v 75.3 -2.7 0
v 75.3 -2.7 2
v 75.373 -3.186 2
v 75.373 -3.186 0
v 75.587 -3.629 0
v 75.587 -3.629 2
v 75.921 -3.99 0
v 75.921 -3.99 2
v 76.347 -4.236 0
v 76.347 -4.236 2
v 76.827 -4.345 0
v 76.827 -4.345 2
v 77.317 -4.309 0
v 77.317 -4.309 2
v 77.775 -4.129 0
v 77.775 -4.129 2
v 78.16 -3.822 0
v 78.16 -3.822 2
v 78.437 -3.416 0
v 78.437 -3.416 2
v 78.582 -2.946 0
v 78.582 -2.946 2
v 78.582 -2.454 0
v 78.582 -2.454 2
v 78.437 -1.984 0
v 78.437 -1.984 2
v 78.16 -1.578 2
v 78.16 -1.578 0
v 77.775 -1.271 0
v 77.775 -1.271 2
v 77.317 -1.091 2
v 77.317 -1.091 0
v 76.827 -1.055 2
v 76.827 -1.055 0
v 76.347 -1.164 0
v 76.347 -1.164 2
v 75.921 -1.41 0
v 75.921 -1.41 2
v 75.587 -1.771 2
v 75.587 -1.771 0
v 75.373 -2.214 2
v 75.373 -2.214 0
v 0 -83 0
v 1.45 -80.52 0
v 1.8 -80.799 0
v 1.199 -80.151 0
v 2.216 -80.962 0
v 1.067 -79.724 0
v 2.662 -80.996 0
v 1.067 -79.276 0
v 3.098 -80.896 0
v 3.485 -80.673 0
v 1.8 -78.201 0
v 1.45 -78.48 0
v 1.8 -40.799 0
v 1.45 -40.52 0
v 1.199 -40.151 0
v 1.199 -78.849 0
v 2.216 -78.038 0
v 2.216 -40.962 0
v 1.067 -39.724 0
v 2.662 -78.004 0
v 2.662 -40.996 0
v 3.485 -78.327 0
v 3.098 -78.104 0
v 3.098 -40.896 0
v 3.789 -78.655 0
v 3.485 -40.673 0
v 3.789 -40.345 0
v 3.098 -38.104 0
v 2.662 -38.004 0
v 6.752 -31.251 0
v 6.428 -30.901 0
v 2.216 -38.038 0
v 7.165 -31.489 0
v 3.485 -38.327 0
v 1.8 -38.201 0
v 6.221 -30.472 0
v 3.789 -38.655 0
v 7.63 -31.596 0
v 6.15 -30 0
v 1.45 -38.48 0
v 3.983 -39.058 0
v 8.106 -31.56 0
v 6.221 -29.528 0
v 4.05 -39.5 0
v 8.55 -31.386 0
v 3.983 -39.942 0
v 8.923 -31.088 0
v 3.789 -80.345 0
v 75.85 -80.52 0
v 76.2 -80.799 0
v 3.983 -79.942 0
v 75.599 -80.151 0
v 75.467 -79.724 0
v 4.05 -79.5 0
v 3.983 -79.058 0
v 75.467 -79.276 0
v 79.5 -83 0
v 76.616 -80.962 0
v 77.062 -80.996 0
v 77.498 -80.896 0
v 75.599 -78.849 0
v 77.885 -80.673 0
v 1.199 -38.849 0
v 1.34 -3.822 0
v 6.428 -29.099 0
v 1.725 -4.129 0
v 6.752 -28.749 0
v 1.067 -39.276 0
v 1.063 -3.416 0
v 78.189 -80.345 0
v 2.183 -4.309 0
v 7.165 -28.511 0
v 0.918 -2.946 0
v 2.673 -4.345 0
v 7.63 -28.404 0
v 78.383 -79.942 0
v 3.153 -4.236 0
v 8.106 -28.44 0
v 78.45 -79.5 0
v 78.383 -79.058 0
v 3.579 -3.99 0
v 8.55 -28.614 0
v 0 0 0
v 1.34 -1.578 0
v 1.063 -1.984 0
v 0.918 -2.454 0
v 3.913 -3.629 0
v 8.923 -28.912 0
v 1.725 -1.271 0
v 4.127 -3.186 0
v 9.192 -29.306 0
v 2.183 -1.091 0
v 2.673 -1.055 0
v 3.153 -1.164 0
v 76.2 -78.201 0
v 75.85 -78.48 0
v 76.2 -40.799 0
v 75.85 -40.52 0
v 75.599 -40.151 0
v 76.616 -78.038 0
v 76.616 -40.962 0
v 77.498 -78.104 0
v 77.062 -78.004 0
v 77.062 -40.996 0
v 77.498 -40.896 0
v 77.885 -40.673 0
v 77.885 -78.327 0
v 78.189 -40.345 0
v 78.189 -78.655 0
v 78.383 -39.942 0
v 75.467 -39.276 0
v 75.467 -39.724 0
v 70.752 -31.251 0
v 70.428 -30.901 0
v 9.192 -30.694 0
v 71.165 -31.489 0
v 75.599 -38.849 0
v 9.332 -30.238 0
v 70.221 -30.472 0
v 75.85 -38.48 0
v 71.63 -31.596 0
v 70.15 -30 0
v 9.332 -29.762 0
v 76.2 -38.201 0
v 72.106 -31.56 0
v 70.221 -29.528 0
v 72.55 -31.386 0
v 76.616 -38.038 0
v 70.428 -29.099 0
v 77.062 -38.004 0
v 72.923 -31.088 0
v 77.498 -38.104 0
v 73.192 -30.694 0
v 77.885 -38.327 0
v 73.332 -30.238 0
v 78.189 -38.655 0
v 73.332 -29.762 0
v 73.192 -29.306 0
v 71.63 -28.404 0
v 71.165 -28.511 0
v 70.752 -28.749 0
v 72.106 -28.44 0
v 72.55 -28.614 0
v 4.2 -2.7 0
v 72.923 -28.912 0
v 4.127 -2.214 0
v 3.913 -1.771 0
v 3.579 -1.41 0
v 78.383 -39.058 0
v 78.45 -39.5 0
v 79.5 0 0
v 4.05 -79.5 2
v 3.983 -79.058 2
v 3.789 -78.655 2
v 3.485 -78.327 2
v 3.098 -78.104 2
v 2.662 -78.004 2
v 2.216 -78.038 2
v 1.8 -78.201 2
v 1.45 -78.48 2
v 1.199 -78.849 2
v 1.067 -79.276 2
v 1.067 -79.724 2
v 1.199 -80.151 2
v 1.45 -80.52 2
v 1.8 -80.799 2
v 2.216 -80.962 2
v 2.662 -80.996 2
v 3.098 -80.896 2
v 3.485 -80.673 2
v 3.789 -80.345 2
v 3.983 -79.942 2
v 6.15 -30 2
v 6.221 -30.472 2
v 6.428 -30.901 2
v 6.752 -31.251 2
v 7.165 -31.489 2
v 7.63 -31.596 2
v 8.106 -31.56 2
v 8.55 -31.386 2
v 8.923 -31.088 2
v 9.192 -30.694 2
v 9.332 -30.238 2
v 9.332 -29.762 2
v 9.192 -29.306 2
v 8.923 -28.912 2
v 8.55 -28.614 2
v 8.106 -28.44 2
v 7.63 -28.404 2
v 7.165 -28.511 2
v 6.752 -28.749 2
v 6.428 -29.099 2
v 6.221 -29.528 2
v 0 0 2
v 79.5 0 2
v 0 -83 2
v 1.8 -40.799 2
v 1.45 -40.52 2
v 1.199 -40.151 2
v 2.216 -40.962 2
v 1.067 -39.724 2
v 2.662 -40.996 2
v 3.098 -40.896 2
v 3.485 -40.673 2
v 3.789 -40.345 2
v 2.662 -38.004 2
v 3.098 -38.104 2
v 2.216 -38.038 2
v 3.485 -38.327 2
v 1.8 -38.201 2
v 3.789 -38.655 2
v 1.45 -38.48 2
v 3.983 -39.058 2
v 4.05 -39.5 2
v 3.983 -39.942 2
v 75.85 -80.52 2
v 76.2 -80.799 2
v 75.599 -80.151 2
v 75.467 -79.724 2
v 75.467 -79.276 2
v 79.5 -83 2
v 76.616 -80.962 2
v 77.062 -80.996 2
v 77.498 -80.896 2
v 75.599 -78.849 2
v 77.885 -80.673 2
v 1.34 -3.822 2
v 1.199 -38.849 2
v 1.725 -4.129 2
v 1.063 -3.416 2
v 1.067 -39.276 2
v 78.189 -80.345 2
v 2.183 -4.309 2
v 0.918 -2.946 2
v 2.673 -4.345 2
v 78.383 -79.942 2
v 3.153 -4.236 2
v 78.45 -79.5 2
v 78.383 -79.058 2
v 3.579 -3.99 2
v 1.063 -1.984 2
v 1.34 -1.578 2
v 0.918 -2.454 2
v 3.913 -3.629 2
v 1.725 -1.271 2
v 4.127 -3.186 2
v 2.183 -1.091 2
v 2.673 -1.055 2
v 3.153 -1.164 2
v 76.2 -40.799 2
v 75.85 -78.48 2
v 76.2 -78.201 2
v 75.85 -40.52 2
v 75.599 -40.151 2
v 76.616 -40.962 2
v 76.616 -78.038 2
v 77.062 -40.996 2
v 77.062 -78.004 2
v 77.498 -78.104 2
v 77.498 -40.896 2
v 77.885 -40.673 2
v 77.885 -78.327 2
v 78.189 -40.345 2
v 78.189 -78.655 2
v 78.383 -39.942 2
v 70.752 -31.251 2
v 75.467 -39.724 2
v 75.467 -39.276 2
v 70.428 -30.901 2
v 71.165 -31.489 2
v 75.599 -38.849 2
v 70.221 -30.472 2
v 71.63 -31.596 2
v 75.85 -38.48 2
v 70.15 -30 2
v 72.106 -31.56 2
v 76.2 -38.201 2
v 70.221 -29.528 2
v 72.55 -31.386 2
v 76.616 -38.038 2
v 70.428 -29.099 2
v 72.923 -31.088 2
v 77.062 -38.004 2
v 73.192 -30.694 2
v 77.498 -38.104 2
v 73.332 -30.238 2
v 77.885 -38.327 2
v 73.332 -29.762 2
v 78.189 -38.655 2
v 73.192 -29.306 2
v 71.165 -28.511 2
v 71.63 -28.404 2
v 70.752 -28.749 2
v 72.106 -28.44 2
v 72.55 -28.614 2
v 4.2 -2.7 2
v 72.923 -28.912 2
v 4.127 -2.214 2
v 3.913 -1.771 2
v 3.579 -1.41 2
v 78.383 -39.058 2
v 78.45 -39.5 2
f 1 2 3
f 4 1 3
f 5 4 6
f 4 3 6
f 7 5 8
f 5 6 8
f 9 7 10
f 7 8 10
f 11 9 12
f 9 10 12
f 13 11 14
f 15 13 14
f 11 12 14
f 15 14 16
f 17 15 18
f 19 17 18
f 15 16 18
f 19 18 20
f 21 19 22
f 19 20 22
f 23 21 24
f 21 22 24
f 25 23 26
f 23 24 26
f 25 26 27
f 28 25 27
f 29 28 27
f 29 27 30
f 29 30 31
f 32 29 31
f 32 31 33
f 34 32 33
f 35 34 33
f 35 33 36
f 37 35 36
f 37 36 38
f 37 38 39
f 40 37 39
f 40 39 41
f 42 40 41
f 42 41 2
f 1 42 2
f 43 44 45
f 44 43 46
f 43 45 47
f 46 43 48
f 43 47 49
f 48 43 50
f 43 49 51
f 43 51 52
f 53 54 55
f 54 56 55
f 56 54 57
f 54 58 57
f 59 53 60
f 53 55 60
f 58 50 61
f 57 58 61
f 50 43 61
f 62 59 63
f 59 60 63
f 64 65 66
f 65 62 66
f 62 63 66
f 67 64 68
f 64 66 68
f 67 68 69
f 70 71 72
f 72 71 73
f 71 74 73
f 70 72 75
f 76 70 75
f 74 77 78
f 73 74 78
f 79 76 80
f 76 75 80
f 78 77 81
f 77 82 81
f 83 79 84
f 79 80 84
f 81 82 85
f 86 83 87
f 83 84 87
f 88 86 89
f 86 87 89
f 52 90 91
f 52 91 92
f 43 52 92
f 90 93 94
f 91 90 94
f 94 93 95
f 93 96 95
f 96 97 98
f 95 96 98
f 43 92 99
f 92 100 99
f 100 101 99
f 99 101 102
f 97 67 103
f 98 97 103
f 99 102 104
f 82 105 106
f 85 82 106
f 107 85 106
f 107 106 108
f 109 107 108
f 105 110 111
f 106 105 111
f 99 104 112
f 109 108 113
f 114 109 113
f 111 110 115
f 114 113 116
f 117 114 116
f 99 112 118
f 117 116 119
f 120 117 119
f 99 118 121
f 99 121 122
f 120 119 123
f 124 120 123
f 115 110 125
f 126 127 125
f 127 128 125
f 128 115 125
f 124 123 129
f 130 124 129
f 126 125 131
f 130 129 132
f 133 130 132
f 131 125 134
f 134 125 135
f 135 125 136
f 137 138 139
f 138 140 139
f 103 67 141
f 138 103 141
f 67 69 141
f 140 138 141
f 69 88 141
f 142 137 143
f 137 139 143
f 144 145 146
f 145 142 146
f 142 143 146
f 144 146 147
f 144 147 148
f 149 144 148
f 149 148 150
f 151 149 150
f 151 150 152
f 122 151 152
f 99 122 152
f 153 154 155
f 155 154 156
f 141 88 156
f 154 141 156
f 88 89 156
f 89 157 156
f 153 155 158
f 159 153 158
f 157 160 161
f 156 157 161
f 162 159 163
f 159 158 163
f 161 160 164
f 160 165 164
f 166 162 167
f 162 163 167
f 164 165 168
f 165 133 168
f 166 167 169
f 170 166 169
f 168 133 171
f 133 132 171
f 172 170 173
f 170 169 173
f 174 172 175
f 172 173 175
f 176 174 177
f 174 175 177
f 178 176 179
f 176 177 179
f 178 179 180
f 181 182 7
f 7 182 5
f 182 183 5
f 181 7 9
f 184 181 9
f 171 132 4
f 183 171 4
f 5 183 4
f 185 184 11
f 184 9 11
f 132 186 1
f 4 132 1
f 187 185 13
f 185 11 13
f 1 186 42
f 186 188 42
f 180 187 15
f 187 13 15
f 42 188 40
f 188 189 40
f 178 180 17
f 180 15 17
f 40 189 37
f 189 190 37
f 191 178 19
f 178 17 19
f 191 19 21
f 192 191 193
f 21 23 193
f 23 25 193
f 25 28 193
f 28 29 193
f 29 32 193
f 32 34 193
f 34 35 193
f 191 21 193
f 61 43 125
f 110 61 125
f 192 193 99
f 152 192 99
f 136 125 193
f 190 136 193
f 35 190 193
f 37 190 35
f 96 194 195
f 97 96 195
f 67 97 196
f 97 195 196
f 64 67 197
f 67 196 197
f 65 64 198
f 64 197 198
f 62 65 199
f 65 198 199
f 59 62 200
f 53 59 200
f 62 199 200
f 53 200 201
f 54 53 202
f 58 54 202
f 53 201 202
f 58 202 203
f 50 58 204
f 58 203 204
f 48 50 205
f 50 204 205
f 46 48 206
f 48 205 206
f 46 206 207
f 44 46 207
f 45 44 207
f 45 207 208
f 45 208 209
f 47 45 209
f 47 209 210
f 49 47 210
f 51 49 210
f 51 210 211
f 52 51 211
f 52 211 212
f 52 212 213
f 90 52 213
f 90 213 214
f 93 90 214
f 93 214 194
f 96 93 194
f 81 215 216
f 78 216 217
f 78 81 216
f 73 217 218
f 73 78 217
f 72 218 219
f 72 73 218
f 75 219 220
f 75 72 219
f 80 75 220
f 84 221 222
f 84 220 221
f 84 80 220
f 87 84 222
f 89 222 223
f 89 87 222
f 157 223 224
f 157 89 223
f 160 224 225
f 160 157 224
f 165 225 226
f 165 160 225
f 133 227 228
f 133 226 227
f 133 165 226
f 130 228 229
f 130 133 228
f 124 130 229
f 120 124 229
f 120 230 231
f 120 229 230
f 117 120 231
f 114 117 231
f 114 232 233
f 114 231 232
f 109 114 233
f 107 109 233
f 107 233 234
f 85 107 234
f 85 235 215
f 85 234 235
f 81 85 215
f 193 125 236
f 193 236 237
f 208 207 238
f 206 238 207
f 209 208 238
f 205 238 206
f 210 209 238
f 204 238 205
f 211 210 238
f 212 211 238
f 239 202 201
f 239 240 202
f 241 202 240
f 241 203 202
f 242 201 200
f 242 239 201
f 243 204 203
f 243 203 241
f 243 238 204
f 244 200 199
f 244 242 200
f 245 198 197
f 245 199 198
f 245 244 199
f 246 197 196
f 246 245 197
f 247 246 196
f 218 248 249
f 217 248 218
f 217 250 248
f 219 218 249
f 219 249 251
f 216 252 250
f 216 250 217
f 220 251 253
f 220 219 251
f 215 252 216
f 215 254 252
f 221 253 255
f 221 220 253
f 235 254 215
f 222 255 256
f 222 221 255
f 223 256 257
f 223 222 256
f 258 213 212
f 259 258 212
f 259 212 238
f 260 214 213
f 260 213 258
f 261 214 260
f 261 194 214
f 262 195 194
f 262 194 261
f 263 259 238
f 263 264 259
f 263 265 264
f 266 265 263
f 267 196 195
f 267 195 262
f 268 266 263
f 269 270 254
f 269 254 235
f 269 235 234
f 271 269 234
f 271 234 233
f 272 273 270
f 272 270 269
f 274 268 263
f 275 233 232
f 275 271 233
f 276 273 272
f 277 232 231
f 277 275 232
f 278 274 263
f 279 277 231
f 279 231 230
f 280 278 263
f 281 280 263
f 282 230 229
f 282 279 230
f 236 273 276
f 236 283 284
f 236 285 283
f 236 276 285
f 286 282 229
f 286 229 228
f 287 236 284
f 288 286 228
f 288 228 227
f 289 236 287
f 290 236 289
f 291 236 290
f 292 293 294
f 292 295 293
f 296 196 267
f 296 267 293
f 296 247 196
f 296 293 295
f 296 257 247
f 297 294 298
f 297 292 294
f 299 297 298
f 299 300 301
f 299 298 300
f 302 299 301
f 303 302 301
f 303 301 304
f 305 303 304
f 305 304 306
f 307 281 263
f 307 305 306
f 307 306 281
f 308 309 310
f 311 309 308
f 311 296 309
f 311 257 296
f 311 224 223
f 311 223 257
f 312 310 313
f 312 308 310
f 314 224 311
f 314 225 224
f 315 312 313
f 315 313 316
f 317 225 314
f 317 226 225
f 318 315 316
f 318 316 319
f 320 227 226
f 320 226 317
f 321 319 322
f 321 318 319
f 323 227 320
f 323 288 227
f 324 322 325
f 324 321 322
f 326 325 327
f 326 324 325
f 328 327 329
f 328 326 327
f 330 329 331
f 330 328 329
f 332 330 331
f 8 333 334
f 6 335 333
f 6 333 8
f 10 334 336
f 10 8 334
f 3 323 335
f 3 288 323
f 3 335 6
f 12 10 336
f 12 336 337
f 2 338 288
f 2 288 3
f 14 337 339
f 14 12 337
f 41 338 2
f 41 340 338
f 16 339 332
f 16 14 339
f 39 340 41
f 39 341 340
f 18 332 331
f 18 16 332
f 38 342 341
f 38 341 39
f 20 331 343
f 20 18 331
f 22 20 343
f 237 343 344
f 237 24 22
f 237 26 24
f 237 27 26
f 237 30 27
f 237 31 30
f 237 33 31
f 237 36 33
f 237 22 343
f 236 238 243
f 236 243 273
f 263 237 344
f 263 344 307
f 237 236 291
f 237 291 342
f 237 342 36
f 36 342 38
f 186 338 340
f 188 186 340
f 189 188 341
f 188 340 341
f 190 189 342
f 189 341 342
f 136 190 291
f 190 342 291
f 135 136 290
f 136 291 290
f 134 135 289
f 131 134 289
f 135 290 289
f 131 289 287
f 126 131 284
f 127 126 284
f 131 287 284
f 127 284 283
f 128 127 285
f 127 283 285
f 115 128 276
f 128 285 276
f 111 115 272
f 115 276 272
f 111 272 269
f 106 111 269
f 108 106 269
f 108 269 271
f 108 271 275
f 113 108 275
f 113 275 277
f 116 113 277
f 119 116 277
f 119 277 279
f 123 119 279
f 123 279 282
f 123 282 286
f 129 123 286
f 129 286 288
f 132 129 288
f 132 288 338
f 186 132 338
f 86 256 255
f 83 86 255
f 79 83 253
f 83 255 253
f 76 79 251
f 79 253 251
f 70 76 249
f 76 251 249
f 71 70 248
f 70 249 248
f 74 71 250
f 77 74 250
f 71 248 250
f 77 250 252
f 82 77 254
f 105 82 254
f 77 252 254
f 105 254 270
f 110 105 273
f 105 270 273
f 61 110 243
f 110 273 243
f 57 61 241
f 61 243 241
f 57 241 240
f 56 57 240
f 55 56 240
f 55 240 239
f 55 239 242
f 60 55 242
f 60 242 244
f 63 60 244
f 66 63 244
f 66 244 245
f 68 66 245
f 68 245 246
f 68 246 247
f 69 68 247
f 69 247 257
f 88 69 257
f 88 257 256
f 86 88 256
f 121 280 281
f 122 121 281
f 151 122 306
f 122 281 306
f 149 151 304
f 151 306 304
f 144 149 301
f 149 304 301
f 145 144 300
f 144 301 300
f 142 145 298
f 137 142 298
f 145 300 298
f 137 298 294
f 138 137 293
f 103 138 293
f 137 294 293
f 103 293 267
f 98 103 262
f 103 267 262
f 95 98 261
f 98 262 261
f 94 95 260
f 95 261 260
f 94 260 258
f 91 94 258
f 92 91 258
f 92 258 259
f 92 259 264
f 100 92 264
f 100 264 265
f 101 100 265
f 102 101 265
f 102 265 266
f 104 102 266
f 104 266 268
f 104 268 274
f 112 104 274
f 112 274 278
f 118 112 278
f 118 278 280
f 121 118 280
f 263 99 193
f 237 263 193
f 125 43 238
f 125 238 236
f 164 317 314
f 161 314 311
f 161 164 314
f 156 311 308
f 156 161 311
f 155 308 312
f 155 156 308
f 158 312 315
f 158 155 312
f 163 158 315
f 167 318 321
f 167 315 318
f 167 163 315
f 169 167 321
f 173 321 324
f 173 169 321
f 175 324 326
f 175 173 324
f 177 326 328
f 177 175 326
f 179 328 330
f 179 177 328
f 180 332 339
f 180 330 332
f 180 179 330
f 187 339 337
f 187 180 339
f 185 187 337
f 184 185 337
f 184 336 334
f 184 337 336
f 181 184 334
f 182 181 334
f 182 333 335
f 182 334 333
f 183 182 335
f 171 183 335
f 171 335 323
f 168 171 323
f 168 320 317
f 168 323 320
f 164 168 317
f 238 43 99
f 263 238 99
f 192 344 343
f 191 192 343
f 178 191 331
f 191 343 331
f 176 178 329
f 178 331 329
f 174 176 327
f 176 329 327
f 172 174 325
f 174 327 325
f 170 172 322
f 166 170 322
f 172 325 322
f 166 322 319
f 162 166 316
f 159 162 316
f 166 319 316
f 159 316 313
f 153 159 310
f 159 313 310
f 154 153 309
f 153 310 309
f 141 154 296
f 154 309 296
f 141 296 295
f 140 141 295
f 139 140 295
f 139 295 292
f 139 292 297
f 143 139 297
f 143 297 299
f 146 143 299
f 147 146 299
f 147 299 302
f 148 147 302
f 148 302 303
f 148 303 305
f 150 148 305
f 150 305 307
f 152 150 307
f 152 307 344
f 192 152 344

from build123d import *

# Parameters (mm, degrees)
SKETCH_1_W          = 79.5
SKETCH_1_H          = 83
EXTRUDE_1_DEPTH     = 2
SKETCH_2_R          = 1.5
SKETCH_2_R_2        = 1.65
CUT_EXTRUDE_1_DEPTH = 3
CUT_EXTRUDE_2_REACH = 116.949
SKETCH_3_R          = 1.6


with BuildPart() as part:
    # 草图1 → 凸台-拉伸1 (new body)
    with BuildSketch(Plane.XY):
        with Locations((39.75, -41.5)):
            Rectangle(SKETCH_1_W, SKETCH_1_H)
    extrude(amount=EXTRUDE_1_DEPTH)

    # 草图2 → 切除-拉伸1 (cut)
    with BuildSketch(Plane.XY.offset(2)):
        with Locations((2.55, -79.5)):
            Circle(SKETCH_2_R)
        with Locations((2.55, -39.5)):
            Circle(SKETCH_2_R)
        with Locations((76.95, -39.5)):
            Circle(SKETCH_2_R)
        with Locations((76.95, -79.5)):
            Circle(SKETCH_2_R)
        with Locations((2.55, -2.7)):
            Circle(SKETCH_2_R_2)
        with Locations(Location((76.95, -2.7, 0), (0, 0, 180))):
            Circle(SKETCH_2_R_2)
    extrude(amount=-CUT_EXTRUDE_1_DEPTH, mode=Mode.SUBTRACT)

    # 草图3 → 切除-拉伸2 (cut, up to next)
    with BuildSketch(Plane.XY, mode=Mode.PRIVATE) as cut_extrude_2_sk1:
        with Locations(Location((7.75, -30, 0), (0, 0, 180))):
            Circle(SKETCH_3_R)
    cut_extrude_2_tool1 = extrude(cut_extrude_2_sk1.sketch, amount=CUT_EXTRUDE_2_REACH, mode=Mode.PRIVATE) & part.part
    # 草图3 → 切除-拉伸2 (cut, up to next)
    with BuildSketch(Plane.XY, mode=Mode.PRIVATE) as cut_extrude_2_sk2:
        with Locations(Location((71.75, -30, 0), (0, 0, 180))):
            Circle(SKETCH_3_R)
    cut_extrude_2_tool2 = extrude(cut_extrude_2_sk2.sketch, amount=CUT_EXTRUDE_2_REACH, mode=Mode.PRIVATE) & part.part
    add(cut_extrude_2_tool1.solids().sort_by_distance((7.75, -30, 0))[0], mode=Mode.SUBTRACT)
    add(cut_extrude_2_tool2.solids().sort_by_distance((71.75, -30, 0))[0], mode=Mode.SUBTRACT)


solid = part.part
